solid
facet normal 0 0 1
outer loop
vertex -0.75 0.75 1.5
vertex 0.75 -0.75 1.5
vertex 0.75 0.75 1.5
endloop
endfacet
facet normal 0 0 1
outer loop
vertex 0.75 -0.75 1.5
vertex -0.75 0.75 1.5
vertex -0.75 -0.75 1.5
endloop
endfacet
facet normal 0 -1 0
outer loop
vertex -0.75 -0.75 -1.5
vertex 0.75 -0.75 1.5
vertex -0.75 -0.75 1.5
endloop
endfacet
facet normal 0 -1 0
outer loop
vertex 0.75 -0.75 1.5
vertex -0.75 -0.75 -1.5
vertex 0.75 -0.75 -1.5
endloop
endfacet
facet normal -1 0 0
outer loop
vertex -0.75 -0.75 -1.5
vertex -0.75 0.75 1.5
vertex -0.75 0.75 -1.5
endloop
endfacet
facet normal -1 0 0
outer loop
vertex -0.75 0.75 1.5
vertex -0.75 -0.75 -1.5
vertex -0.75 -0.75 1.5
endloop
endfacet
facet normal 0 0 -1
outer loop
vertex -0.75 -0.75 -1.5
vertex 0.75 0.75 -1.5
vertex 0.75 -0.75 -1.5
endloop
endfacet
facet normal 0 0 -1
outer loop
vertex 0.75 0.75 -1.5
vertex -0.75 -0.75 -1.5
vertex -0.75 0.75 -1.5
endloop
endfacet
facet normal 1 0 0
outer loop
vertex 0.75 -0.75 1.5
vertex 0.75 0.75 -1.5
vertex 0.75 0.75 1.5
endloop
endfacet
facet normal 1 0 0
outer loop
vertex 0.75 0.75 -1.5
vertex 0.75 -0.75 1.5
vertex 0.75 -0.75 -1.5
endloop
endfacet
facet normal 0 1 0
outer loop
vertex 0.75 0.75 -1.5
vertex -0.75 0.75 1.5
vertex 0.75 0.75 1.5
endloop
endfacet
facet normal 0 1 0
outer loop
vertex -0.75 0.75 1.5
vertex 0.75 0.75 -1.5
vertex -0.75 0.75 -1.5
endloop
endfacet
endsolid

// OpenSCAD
translate([0.0,0,0.0]){
	rotate([0,-0.0,0]){
		cube([1.0,1.0,2.0], center = true);
	}
}
translate([0,0.0,0.0]){
	rotate([0,-0.0,90]){
		cube([1.5,1.5,3.0], center = true);
	}
}
